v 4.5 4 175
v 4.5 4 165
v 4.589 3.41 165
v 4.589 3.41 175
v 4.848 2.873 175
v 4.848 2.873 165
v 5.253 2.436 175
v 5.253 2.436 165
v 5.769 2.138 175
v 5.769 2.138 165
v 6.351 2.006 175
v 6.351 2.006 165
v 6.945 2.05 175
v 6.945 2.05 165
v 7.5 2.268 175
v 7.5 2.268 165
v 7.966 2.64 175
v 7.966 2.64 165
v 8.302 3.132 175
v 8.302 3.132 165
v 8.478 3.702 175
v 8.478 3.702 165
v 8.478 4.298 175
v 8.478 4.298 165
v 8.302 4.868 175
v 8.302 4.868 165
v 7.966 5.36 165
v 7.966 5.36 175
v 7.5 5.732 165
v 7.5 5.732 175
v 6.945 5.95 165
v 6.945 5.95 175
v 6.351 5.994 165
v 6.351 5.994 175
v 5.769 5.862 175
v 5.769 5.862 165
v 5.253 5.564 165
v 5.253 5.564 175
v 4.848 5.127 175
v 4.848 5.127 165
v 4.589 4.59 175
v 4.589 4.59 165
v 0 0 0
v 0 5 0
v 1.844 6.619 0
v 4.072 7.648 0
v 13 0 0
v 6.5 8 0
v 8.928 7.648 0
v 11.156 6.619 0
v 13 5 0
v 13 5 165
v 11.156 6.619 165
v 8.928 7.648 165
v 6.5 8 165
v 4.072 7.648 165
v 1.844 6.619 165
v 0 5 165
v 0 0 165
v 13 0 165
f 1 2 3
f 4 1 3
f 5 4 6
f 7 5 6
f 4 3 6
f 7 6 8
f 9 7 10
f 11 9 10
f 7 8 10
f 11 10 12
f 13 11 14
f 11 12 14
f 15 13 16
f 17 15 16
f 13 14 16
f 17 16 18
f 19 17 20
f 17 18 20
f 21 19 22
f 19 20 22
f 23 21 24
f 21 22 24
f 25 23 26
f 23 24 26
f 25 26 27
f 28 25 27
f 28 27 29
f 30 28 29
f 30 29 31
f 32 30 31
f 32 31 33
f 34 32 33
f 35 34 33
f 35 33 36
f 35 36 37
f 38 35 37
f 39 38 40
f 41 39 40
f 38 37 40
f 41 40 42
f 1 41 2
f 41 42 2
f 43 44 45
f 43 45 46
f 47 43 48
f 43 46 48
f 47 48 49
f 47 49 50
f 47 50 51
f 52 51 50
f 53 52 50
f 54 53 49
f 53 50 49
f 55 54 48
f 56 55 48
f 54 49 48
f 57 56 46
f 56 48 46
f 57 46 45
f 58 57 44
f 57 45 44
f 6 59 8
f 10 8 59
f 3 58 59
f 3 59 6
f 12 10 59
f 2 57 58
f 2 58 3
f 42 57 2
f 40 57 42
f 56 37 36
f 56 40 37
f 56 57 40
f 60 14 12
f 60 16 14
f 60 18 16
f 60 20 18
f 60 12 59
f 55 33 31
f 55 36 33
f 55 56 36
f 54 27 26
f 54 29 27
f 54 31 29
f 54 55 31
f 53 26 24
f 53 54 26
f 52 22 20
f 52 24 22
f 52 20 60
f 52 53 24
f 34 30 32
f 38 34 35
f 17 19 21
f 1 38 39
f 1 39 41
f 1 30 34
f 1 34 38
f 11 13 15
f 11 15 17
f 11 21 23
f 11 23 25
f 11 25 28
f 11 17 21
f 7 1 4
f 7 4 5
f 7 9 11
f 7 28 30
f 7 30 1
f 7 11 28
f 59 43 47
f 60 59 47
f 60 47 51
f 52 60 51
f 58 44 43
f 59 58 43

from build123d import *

# Parameters (mm, degrees)
BOSS_EXTRUDE1_DEPTH = 165
SKETCH2_R           = 2
BOSS_EXTRUDE2_DEPTH = 10


with BuildPart() as part:
    # Sketch1 → Boss-Extrude1 (new body)
    with BuildSketch(Plane.XY):
        with BuildLine():
            Line((0, 0), (13, 0))
            Line((13, 0), (13, 5))
            ThreePointArc((13, 5), (6.5, 8), (0, 5))
            Line((0, 5), (0, 0))
        make_face()
    extrude(amount=BOSS_EXTRUDE1_DEPTH)

    # Sketch2 → Boss-Extrude2 (add)
    with BuildSketch(Plane.XY.offset(165)):
        with Locations(Location((6.5, 4, 0), (0, 0, 180))):
            Circle(SKETCH2_R)
    extrude(amount=BOSS_EXTRUDE2_DEPTH)


solid = part.part
